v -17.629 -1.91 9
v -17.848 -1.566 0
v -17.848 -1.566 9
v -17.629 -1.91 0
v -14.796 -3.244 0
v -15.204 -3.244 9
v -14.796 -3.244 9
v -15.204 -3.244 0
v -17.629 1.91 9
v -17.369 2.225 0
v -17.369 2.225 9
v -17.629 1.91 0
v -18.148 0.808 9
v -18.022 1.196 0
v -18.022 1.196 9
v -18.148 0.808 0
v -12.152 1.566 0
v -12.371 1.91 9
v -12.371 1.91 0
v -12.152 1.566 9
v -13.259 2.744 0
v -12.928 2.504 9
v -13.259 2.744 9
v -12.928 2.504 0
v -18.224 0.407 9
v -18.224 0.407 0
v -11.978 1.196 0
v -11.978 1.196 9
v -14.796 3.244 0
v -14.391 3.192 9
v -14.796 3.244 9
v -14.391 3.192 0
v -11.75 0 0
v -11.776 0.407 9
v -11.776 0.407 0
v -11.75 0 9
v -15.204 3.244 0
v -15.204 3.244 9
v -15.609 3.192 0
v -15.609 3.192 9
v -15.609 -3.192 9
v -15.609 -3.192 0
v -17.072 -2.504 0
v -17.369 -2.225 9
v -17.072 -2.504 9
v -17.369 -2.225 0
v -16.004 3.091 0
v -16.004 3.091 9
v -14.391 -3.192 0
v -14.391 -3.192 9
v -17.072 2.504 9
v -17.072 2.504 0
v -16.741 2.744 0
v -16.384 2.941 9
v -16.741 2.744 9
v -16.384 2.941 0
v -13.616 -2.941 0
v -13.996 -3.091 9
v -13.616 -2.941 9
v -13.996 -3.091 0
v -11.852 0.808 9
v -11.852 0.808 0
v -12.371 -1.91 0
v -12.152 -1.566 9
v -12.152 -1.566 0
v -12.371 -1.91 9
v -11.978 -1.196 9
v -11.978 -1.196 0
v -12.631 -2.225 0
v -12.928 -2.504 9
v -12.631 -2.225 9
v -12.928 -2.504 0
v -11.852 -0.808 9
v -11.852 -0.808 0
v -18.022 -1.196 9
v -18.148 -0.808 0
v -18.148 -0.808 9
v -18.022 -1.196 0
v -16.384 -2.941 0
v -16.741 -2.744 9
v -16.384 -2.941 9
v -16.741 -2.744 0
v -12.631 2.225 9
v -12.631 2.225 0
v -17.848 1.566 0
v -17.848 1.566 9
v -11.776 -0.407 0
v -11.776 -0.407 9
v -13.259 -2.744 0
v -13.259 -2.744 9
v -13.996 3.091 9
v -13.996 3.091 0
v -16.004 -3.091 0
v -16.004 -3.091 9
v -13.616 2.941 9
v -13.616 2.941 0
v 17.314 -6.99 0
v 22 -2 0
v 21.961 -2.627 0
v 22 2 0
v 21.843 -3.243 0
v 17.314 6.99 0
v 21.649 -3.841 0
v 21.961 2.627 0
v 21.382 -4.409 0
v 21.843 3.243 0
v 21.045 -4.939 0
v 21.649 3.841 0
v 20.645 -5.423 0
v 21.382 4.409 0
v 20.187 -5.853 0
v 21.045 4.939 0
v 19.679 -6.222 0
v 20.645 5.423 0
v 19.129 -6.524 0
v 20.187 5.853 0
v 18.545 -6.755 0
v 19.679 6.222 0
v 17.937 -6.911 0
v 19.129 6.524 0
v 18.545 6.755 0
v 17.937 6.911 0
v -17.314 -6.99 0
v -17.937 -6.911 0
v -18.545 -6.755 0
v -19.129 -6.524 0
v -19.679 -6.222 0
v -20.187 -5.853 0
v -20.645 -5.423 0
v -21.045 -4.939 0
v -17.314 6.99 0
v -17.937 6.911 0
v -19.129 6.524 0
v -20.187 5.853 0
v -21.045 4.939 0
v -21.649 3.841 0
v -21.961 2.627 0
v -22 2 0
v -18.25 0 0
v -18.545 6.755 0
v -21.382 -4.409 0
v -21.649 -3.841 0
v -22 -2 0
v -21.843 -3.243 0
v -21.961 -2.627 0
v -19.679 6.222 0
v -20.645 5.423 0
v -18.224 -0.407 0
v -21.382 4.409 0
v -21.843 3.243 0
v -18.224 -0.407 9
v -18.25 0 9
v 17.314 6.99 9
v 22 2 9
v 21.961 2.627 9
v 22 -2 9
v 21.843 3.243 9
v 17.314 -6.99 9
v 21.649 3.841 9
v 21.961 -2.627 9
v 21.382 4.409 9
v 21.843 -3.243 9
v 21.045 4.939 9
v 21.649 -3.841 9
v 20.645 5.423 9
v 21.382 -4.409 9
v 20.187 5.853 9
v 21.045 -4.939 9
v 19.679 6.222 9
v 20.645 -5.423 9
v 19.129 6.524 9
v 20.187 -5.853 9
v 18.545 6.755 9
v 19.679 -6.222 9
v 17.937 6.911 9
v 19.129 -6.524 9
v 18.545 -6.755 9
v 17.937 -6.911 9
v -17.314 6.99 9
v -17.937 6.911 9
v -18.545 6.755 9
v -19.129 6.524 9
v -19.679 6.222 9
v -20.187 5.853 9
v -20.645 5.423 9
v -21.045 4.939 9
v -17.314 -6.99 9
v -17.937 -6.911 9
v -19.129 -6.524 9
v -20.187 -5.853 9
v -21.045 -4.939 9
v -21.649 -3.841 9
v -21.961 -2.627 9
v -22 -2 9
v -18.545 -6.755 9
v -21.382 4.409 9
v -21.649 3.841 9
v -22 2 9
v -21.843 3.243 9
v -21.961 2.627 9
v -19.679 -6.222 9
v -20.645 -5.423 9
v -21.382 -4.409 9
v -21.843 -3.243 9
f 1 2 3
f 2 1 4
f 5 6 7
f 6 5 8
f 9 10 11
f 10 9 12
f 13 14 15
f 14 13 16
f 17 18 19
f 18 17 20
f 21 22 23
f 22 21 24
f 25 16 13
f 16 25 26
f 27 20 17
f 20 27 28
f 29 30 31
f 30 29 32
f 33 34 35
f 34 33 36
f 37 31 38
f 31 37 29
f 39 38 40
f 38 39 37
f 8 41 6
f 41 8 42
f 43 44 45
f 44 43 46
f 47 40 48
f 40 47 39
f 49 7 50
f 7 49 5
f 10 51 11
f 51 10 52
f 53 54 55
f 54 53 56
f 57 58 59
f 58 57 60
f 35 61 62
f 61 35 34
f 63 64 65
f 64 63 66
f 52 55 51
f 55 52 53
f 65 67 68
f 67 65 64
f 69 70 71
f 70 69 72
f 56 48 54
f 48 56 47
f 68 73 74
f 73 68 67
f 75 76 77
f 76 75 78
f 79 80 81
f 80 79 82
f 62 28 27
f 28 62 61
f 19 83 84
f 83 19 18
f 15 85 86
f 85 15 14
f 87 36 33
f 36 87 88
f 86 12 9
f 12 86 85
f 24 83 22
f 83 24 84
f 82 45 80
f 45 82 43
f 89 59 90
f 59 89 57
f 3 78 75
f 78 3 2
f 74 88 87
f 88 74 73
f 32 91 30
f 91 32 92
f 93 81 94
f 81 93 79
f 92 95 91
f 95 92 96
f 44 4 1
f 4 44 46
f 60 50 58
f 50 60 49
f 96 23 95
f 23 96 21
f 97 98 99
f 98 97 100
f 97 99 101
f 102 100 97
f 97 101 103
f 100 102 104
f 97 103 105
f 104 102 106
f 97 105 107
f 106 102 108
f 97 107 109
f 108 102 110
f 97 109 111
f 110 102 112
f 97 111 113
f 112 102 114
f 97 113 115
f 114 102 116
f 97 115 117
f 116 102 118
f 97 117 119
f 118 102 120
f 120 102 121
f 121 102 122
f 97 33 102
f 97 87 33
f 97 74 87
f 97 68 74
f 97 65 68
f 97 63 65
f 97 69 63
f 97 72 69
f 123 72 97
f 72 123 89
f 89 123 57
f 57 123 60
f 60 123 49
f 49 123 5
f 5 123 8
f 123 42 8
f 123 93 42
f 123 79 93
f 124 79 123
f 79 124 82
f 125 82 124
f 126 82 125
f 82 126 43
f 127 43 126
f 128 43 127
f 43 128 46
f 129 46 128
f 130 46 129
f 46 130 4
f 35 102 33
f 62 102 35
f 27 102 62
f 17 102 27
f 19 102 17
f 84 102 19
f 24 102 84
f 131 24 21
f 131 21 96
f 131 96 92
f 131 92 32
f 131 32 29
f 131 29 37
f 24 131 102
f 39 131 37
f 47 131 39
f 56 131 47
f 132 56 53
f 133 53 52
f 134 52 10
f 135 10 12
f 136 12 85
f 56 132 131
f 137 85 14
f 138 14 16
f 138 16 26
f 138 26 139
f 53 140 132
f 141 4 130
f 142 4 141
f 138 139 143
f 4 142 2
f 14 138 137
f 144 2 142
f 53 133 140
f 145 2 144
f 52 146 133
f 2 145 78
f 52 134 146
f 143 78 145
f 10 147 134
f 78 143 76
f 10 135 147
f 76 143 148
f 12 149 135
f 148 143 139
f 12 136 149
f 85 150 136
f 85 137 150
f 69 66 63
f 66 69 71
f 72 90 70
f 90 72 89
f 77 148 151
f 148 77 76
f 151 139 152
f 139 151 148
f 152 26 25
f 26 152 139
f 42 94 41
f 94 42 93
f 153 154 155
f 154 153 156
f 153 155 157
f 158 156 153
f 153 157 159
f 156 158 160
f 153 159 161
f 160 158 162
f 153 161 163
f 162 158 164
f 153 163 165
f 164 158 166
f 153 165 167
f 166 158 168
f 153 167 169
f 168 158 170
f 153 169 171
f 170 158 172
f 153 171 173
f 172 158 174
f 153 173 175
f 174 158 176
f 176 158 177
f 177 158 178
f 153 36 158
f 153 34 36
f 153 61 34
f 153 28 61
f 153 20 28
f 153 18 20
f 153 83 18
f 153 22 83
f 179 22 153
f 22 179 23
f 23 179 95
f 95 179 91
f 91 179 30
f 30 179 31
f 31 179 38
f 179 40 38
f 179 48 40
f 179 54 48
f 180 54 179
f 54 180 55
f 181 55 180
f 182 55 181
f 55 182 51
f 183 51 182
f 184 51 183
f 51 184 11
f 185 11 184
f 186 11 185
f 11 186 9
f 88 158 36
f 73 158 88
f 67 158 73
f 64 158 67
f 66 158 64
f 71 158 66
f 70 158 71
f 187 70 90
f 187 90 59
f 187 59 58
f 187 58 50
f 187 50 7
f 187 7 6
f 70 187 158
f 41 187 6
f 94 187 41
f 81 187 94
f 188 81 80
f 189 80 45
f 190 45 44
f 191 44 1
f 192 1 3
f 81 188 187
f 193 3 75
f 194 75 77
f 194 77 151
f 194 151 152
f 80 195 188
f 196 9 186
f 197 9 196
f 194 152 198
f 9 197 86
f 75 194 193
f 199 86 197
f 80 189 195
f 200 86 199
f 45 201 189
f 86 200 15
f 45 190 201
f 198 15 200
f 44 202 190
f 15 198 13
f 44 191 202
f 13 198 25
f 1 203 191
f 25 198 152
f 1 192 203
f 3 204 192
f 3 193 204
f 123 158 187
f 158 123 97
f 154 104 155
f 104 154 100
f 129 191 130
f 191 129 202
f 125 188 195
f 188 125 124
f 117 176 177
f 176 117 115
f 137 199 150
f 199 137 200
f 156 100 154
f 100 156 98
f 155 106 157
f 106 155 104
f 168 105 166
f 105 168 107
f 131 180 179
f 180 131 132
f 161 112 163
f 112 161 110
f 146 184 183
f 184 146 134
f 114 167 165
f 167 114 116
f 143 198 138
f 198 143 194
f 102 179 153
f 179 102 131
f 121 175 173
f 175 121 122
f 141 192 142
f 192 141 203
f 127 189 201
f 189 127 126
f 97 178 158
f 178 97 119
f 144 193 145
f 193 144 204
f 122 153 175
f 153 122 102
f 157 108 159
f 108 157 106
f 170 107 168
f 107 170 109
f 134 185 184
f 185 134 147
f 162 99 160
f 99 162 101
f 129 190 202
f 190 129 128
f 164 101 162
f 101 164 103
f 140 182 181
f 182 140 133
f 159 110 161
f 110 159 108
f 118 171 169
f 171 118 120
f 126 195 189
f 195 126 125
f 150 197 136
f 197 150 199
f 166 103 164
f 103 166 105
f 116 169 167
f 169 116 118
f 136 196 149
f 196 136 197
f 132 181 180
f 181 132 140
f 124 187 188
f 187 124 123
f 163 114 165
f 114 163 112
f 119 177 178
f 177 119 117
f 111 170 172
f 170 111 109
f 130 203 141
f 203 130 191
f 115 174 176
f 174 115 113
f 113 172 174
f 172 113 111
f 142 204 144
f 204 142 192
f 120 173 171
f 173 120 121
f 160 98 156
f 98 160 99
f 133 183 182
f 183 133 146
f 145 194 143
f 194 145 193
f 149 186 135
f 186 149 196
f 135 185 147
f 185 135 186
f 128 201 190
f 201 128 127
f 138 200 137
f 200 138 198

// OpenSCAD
$fn = 50;


difference() {
	union() {
		hull() {
			translate(v = [-17.0000000000, 2.0000000000, 0]) {
				cylinder(h = 9, r = 5);
			}
			translate(v = [17.0000000000, 2.0000000000, 0]) {
				cylinder(h = 9, r = 5);
			}
			translate(v = [-17.0000000000, -2.0000000000, 0]) {
				cylinder(h = 9, r = 5);
			}
			translate(v = [17.0000000000, -2.0000000000, 0]) {
				cylinder(h = 9, r = 5);
			}
		}
	}
	union() {
		translate(v = [-15.0000000000, 0.0000000000, 0]) {
			cylinder(h = 9, r = 3.2500000000);
		}
		translate(v = [-15.0000000000, 0.0000000000, 0]) {
			cylinder(h = 9, r = 1.8000000000);
		}
		translate(v = [-15.0000000000, 0.0000000000, 0]) {
			cylinder(h = 9, r = 1.8000000000);
		}
		translate(v = [-15.0000000000, 0.0000000000, 0]) {
			cylinder(h = 9, r = 1.8000000000);
		}
	}
}
